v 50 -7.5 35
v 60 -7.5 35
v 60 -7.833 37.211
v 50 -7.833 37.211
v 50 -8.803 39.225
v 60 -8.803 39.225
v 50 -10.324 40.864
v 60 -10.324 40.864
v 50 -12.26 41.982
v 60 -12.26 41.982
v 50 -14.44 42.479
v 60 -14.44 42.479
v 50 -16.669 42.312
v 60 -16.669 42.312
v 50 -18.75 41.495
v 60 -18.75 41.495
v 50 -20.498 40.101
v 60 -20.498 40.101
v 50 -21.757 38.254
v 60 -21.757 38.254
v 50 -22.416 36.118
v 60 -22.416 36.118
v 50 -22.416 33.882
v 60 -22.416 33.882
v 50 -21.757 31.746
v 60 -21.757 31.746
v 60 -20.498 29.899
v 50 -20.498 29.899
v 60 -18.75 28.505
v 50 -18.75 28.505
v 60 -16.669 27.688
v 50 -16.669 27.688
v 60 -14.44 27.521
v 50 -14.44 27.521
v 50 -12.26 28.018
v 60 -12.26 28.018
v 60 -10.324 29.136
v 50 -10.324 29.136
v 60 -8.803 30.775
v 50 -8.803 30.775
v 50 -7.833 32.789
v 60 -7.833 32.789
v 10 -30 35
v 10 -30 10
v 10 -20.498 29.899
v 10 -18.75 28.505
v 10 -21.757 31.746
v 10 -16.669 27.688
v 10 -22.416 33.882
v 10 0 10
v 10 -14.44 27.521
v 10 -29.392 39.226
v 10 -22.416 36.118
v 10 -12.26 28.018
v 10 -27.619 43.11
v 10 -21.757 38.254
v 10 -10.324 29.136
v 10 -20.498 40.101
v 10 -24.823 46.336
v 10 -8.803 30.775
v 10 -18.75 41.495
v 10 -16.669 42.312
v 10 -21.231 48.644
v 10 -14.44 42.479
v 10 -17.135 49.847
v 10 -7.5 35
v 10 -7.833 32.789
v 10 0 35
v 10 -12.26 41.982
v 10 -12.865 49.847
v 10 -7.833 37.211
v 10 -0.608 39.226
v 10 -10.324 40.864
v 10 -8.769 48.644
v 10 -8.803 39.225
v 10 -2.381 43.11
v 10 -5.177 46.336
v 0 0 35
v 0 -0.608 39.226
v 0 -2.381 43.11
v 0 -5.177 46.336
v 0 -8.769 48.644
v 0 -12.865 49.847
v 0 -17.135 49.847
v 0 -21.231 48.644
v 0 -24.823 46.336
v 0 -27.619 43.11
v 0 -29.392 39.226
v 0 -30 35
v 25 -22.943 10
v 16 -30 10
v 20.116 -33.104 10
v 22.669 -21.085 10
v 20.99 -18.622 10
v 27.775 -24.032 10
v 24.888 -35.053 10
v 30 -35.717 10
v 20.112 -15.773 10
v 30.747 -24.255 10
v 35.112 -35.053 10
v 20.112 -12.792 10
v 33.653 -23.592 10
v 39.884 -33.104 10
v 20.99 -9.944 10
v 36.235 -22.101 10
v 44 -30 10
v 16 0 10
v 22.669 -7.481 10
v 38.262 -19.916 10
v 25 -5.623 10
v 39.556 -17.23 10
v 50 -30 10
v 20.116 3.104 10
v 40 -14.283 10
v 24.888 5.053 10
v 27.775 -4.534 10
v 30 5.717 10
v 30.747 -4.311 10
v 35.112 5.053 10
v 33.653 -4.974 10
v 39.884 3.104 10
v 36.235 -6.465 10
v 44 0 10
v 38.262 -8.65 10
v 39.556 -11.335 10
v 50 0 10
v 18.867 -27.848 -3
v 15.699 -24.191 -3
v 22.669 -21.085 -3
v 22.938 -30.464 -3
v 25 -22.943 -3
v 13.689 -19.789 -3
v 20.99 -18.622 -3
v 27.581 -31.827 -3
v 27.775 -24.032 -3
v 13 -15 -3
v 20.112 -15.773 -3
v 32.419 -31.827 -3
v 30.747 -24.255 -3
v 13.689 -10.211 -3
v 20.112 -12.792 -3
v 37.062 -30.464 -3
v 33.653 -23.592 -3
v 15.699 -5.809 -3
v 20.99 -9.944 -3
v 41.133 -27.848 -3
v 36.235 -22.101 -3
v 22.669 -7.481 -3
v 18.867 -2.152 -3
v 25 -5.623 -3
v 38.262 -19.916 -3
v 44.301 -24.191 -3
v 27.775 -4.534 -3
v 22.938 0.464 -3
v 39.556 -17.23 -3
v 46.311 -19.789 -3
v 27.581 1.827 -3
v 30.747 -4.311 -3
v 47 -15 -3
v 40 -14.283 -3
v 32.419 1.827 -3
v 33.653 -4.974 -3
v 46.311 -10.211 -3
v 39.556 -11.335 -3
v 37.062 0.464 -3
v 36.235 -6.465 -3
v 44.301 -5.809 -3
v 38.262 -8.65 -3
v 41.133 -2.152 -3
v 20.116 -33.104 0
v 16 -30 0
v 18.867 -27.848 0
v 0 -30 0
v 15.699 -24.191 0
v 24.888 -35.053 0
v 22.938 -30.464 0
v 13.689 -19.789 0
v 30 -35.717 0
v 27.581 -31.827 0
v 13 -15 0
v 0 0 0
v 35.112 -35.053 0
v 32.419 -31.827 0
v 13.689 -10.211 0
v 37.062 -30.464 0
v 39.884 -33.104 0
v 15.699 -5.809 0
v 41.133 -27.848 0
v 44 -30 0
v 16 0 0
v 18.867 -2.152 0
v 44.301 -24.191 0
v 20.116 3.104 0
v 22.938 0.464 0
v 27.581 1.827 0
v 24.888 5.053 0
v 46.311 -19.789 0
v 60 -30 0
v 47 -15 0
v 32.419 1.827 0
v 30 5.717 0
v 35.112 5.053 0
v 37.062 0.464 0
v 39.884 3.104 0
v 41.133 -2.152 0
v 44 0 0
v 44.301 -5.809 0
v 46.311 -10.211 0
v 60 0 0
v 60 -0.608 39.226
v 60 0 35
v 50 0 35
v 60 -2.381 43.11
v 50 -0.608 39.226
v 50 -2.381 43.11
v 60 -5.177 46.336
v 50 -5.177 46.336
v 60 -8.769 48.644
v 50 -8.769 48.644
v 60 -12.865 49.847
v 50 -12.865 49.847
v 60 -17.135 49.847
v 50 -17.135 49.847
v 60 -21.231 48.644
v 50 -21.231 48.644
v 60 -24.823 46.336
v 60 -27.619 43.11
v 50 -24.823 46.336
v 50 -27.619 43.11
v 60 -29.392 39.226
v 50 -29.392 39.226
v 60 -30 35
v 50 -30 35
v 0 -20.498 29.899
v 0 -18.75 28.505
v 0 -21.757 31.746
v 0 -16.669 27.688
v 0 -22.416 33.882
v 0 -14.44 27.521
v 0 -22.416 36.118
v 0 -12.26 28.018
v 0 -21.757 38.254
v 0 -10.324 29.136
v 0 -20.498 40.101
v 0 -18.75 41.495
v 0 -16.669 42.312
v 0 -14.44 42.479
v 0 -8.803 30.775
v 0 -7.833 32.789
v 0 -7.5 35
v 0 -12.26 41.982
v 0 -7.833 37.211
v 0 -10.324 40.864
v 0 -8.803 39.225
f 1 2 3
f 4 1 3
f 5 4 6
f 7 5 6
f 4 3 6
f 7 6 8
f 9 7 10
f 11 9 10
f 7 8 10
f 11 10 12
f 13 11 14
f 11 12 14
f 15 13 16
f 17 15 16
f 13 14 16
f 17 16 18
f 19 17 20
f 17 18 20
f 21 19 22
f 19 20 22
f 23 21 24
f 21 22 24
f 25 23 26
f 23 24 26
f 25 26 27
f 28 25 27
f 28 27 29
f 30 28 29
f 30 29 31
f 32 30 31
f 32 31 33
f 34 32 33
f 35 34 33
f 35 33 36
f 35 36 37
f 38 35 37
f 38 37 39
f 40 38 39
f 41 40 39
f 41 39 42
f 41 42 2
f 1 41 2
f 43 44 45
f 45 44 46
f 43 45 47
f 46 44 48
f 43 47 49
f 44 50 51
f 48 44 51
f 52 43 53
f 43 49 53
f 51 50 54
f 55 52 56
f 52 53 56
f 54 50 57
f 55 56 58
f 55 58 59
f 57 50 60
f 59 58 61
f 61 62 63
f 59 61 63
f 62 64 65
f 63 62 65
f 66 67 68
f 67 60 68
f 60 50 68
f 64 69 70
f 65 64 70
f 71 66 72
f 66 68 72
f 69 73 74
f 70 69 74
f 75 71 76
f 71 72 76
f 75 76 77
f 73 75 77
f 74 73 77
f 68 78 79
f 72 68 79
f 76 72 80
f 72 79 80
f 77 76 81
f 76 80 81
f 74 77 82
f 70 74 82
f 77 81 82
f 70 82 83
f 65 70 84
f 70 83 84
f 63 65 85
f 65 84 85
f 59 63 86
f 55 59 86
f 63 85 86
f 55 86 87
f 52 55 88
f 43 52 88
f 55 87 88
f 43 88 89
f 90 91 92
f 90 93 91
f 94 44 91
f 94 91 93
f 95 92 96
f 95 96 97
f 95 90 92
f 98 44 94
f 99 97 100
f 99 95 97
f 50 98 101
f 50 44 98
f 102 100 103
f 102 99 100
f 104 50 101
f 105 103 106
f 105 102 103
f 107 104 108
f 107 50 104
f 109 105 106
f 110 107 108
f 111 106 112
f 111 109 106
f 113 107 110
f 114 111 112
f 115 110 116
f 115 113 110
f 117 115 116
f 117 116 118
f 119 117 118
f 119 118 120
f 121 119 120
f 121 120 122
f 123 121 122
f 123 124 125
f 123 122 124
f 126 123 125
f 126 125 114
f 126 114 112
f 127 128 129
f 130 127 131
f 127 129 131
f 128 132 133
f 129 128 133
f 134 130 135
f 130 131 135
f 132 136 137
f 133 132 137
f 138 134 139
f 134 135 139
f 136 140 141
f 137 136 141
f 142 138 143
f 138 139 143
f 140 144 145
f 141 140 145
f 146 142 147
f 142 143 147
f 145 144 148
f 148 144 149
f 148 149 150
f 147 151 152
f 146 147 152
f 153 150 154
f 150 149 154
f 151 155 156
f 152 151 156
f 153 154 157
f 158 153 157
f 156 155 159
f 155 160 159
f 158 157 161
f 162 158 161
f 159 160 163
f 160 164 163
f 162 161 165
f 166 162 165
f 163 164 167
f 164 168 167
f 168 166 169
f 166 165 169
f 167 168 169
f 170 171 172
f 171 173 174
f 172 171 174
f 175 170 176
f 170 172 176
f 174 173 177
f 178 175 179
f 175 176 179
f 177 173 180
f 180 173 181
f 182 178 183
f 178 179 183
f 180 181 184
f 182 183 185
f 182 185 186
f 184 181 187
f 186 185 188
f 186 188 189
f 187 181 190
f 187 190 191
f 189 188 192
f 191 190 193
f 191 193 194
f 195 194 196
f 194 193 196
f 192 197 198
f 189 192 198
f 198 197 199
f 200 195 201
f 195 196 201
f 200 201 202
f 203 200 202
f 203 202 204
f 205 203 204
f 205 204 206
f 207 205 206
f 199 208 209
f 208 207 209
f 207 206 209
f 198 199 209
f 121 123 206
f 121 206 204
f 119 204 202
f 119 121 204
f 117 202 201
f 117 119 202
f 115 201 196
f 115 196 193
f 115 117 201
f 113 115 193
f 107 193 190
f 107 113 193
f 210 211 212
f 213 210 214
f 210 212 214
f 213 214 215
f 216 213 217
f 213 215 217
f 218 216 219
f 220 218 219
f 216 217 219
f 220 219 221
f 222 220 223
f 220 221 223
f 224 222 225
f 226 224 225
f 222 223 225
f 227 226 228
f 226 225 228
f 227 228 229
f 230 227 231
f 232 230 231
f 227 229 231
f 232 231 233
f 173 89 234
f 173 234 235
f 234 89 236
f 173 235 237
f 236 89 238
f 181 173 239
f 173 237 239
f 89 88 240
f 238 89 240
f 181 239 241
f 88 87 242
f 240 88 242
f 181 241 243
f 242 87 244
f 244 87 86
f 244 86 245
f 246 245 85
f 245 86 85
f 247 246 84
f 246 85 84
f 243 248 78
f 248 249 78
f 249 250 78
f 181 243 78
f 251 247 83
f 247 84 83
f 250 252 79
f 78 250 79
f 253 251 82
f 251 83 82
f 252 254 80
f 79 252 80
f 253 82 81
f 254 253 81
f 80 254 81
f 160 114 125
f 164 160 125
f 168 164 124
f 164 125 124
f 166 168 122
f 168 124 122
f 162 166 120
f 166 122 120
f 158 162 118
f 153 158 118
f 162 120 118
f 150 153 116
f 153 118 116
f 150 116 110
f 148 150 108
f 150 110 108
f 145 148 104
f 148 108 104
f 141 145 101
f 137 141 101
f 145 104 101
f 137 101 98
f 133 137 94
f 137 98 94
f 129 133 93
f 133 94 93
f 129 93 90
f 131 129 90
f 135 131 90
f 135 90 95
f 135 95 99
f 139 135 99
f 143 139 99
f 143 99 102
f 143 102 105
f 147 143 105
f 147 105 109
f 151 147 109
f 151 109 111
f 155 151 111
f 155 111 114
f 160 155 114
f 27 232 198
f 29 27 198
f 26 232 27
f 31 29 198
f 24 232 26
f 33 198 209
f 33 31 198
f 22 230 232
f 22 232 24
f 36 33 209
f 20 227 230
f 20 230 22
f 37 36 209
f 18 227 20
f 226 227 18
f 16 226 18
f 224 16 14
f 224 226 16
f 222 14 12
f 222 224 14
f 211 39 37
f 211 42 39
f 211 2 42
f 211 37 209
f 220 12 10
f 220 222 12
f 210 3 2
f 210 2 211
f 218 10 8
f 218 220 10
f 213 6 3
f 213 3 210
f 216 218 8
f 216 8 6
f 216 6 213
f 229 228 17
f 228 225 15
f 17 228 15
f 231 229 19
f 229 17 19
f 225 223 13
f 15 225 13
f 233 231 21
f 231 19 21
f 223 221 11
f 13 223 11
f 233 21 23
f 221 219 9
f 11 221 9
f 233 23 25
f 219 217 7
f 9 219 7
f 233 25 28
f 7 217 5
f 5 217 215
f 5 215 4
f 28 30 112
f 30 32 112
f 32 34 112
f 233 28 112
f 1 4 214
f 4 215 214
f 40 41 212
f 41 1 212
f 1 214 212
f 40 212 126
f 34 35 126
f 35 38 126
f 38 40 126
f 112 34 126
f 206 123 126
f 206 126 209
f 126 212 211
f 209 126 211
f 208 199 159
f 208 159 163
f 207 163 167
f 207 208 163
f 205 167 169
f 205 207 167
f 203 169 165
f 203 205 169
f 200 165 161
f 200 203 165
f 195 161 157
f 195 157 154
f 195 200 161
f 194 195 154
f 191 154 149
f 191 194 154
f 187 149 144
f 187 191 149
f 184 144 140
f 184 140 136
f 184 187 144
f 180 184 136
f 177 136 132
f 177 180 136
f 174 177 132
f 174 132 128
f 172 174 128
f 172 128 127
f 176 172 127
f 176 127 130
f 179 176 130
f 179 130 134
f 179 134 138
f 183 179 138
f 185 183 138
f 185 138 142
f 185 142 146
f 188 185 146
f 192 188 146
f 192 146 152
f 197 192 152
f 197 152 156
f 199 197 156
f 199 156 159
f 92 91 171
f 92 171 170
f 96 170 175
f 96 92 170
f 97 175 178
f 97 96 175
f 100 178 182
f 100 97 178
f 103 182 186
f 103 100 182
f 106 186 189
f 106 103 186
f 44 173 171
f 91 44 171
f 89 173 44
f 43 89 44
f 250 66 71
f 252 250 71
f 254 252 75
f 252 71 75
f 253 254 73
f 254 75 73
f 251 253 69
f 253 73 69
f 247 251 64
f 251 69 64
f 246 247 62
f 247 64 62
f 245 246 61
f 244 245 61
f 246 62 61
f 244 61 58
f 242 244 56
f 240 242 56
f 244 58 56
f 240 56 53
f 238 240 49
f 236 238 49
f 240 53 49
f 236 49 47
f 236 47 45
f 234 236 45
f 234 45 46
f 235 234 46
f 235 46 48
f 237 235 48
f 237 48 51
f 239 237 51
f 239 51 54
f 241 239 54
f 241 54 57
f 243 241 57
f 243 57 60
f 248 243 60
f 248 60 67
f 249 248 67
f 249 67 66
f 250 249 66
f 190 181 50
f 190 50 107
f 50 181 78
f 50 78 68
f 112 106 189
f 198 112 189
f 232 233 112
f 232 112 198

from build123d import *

# Parameters (mm, degrees)
F1_DEPTH  = 30
F3_DEPTH  = 60
F4_R      = 7.5
F5_DEPTH  = 60.001
F6_W      = 40
F6_H      = 40
F7_DEPTH  = 30.001
F8_R      = 17
F9_DEPTH  = 13
F11_DEPTH = 10
F12_R     = 10
F13_DEPTH = 13.001


with BuildPart() as f1:
    # F0 (on Front) → F1 (new body)
    with BuildSketch(Plane.XZ):
        Polygon((0, 35), (0, 0), (60, 0), (60, 35), (50, 35), (50, 10), (10, 10), (10, 35), align=None)
    extrude(amount=F1_DEPTH)

    # F2 (on Right) → F3 (join)
    with BuildSketch(Plane.YZ):
        with BuildLine():
            Line((-30, 35), (0, 35))
            ThreePointArc((0, 35), (-15, 50), (-30, 35))
        make_face()
    extrude(amount=F3_DEPTH)

    # F4 (on face) → F5 (cut, through all)
    with BuildSketch(Plane.YZ.offset(60)):
        with Locations((-15, 35)):
            Circle(F4_R)
    extrude(amount=-F5_DEPTH, mode=Mode.SUBTRACT)

    # F6 (on Front) → F7 (cut, through all)
    with BuildSketch(Plane.XZ):
        with Locations((30, 30)):
            Rectangle(F6_W, F6_H)
    extrude(amount=F7_DEPTH, mode=Mode.SUBTRACT)

    # F8 (on face) → F9 (join)
    with BuildSketch(Plane.XY.offset(10)):
        with Locations((30, -15)):
            Circle(F8_R)
    extrude(amount=-F9_DEPTH)

    # F10 (on face) → F11 (join)
    with BuildSketch(Plane.XY.offset(10)):
        with BuildLine():
            Line((16, 0), (44, 0))
            ThreePointArc((44, 0), (30, 5.717143), (16, 0))
        make_face()
        with BuildLine():
            Line((44, -30), (16, -30))
            ThreePointArc((16, -30), (30, -35.717143), (44, -30))
        make_face()
    extrude(amount=-F11_DEPTH)

    # F12 (on face) → F13 (cut, through all)
    with BuildSketch(Plane.XY.offset(10)):
        with Locations((30, -14.282857)):
            Circle(F12_R)
    extrude(amount=-F13_DEPTH, mode=Mode.SUBTRACT)


solid = f1.part
